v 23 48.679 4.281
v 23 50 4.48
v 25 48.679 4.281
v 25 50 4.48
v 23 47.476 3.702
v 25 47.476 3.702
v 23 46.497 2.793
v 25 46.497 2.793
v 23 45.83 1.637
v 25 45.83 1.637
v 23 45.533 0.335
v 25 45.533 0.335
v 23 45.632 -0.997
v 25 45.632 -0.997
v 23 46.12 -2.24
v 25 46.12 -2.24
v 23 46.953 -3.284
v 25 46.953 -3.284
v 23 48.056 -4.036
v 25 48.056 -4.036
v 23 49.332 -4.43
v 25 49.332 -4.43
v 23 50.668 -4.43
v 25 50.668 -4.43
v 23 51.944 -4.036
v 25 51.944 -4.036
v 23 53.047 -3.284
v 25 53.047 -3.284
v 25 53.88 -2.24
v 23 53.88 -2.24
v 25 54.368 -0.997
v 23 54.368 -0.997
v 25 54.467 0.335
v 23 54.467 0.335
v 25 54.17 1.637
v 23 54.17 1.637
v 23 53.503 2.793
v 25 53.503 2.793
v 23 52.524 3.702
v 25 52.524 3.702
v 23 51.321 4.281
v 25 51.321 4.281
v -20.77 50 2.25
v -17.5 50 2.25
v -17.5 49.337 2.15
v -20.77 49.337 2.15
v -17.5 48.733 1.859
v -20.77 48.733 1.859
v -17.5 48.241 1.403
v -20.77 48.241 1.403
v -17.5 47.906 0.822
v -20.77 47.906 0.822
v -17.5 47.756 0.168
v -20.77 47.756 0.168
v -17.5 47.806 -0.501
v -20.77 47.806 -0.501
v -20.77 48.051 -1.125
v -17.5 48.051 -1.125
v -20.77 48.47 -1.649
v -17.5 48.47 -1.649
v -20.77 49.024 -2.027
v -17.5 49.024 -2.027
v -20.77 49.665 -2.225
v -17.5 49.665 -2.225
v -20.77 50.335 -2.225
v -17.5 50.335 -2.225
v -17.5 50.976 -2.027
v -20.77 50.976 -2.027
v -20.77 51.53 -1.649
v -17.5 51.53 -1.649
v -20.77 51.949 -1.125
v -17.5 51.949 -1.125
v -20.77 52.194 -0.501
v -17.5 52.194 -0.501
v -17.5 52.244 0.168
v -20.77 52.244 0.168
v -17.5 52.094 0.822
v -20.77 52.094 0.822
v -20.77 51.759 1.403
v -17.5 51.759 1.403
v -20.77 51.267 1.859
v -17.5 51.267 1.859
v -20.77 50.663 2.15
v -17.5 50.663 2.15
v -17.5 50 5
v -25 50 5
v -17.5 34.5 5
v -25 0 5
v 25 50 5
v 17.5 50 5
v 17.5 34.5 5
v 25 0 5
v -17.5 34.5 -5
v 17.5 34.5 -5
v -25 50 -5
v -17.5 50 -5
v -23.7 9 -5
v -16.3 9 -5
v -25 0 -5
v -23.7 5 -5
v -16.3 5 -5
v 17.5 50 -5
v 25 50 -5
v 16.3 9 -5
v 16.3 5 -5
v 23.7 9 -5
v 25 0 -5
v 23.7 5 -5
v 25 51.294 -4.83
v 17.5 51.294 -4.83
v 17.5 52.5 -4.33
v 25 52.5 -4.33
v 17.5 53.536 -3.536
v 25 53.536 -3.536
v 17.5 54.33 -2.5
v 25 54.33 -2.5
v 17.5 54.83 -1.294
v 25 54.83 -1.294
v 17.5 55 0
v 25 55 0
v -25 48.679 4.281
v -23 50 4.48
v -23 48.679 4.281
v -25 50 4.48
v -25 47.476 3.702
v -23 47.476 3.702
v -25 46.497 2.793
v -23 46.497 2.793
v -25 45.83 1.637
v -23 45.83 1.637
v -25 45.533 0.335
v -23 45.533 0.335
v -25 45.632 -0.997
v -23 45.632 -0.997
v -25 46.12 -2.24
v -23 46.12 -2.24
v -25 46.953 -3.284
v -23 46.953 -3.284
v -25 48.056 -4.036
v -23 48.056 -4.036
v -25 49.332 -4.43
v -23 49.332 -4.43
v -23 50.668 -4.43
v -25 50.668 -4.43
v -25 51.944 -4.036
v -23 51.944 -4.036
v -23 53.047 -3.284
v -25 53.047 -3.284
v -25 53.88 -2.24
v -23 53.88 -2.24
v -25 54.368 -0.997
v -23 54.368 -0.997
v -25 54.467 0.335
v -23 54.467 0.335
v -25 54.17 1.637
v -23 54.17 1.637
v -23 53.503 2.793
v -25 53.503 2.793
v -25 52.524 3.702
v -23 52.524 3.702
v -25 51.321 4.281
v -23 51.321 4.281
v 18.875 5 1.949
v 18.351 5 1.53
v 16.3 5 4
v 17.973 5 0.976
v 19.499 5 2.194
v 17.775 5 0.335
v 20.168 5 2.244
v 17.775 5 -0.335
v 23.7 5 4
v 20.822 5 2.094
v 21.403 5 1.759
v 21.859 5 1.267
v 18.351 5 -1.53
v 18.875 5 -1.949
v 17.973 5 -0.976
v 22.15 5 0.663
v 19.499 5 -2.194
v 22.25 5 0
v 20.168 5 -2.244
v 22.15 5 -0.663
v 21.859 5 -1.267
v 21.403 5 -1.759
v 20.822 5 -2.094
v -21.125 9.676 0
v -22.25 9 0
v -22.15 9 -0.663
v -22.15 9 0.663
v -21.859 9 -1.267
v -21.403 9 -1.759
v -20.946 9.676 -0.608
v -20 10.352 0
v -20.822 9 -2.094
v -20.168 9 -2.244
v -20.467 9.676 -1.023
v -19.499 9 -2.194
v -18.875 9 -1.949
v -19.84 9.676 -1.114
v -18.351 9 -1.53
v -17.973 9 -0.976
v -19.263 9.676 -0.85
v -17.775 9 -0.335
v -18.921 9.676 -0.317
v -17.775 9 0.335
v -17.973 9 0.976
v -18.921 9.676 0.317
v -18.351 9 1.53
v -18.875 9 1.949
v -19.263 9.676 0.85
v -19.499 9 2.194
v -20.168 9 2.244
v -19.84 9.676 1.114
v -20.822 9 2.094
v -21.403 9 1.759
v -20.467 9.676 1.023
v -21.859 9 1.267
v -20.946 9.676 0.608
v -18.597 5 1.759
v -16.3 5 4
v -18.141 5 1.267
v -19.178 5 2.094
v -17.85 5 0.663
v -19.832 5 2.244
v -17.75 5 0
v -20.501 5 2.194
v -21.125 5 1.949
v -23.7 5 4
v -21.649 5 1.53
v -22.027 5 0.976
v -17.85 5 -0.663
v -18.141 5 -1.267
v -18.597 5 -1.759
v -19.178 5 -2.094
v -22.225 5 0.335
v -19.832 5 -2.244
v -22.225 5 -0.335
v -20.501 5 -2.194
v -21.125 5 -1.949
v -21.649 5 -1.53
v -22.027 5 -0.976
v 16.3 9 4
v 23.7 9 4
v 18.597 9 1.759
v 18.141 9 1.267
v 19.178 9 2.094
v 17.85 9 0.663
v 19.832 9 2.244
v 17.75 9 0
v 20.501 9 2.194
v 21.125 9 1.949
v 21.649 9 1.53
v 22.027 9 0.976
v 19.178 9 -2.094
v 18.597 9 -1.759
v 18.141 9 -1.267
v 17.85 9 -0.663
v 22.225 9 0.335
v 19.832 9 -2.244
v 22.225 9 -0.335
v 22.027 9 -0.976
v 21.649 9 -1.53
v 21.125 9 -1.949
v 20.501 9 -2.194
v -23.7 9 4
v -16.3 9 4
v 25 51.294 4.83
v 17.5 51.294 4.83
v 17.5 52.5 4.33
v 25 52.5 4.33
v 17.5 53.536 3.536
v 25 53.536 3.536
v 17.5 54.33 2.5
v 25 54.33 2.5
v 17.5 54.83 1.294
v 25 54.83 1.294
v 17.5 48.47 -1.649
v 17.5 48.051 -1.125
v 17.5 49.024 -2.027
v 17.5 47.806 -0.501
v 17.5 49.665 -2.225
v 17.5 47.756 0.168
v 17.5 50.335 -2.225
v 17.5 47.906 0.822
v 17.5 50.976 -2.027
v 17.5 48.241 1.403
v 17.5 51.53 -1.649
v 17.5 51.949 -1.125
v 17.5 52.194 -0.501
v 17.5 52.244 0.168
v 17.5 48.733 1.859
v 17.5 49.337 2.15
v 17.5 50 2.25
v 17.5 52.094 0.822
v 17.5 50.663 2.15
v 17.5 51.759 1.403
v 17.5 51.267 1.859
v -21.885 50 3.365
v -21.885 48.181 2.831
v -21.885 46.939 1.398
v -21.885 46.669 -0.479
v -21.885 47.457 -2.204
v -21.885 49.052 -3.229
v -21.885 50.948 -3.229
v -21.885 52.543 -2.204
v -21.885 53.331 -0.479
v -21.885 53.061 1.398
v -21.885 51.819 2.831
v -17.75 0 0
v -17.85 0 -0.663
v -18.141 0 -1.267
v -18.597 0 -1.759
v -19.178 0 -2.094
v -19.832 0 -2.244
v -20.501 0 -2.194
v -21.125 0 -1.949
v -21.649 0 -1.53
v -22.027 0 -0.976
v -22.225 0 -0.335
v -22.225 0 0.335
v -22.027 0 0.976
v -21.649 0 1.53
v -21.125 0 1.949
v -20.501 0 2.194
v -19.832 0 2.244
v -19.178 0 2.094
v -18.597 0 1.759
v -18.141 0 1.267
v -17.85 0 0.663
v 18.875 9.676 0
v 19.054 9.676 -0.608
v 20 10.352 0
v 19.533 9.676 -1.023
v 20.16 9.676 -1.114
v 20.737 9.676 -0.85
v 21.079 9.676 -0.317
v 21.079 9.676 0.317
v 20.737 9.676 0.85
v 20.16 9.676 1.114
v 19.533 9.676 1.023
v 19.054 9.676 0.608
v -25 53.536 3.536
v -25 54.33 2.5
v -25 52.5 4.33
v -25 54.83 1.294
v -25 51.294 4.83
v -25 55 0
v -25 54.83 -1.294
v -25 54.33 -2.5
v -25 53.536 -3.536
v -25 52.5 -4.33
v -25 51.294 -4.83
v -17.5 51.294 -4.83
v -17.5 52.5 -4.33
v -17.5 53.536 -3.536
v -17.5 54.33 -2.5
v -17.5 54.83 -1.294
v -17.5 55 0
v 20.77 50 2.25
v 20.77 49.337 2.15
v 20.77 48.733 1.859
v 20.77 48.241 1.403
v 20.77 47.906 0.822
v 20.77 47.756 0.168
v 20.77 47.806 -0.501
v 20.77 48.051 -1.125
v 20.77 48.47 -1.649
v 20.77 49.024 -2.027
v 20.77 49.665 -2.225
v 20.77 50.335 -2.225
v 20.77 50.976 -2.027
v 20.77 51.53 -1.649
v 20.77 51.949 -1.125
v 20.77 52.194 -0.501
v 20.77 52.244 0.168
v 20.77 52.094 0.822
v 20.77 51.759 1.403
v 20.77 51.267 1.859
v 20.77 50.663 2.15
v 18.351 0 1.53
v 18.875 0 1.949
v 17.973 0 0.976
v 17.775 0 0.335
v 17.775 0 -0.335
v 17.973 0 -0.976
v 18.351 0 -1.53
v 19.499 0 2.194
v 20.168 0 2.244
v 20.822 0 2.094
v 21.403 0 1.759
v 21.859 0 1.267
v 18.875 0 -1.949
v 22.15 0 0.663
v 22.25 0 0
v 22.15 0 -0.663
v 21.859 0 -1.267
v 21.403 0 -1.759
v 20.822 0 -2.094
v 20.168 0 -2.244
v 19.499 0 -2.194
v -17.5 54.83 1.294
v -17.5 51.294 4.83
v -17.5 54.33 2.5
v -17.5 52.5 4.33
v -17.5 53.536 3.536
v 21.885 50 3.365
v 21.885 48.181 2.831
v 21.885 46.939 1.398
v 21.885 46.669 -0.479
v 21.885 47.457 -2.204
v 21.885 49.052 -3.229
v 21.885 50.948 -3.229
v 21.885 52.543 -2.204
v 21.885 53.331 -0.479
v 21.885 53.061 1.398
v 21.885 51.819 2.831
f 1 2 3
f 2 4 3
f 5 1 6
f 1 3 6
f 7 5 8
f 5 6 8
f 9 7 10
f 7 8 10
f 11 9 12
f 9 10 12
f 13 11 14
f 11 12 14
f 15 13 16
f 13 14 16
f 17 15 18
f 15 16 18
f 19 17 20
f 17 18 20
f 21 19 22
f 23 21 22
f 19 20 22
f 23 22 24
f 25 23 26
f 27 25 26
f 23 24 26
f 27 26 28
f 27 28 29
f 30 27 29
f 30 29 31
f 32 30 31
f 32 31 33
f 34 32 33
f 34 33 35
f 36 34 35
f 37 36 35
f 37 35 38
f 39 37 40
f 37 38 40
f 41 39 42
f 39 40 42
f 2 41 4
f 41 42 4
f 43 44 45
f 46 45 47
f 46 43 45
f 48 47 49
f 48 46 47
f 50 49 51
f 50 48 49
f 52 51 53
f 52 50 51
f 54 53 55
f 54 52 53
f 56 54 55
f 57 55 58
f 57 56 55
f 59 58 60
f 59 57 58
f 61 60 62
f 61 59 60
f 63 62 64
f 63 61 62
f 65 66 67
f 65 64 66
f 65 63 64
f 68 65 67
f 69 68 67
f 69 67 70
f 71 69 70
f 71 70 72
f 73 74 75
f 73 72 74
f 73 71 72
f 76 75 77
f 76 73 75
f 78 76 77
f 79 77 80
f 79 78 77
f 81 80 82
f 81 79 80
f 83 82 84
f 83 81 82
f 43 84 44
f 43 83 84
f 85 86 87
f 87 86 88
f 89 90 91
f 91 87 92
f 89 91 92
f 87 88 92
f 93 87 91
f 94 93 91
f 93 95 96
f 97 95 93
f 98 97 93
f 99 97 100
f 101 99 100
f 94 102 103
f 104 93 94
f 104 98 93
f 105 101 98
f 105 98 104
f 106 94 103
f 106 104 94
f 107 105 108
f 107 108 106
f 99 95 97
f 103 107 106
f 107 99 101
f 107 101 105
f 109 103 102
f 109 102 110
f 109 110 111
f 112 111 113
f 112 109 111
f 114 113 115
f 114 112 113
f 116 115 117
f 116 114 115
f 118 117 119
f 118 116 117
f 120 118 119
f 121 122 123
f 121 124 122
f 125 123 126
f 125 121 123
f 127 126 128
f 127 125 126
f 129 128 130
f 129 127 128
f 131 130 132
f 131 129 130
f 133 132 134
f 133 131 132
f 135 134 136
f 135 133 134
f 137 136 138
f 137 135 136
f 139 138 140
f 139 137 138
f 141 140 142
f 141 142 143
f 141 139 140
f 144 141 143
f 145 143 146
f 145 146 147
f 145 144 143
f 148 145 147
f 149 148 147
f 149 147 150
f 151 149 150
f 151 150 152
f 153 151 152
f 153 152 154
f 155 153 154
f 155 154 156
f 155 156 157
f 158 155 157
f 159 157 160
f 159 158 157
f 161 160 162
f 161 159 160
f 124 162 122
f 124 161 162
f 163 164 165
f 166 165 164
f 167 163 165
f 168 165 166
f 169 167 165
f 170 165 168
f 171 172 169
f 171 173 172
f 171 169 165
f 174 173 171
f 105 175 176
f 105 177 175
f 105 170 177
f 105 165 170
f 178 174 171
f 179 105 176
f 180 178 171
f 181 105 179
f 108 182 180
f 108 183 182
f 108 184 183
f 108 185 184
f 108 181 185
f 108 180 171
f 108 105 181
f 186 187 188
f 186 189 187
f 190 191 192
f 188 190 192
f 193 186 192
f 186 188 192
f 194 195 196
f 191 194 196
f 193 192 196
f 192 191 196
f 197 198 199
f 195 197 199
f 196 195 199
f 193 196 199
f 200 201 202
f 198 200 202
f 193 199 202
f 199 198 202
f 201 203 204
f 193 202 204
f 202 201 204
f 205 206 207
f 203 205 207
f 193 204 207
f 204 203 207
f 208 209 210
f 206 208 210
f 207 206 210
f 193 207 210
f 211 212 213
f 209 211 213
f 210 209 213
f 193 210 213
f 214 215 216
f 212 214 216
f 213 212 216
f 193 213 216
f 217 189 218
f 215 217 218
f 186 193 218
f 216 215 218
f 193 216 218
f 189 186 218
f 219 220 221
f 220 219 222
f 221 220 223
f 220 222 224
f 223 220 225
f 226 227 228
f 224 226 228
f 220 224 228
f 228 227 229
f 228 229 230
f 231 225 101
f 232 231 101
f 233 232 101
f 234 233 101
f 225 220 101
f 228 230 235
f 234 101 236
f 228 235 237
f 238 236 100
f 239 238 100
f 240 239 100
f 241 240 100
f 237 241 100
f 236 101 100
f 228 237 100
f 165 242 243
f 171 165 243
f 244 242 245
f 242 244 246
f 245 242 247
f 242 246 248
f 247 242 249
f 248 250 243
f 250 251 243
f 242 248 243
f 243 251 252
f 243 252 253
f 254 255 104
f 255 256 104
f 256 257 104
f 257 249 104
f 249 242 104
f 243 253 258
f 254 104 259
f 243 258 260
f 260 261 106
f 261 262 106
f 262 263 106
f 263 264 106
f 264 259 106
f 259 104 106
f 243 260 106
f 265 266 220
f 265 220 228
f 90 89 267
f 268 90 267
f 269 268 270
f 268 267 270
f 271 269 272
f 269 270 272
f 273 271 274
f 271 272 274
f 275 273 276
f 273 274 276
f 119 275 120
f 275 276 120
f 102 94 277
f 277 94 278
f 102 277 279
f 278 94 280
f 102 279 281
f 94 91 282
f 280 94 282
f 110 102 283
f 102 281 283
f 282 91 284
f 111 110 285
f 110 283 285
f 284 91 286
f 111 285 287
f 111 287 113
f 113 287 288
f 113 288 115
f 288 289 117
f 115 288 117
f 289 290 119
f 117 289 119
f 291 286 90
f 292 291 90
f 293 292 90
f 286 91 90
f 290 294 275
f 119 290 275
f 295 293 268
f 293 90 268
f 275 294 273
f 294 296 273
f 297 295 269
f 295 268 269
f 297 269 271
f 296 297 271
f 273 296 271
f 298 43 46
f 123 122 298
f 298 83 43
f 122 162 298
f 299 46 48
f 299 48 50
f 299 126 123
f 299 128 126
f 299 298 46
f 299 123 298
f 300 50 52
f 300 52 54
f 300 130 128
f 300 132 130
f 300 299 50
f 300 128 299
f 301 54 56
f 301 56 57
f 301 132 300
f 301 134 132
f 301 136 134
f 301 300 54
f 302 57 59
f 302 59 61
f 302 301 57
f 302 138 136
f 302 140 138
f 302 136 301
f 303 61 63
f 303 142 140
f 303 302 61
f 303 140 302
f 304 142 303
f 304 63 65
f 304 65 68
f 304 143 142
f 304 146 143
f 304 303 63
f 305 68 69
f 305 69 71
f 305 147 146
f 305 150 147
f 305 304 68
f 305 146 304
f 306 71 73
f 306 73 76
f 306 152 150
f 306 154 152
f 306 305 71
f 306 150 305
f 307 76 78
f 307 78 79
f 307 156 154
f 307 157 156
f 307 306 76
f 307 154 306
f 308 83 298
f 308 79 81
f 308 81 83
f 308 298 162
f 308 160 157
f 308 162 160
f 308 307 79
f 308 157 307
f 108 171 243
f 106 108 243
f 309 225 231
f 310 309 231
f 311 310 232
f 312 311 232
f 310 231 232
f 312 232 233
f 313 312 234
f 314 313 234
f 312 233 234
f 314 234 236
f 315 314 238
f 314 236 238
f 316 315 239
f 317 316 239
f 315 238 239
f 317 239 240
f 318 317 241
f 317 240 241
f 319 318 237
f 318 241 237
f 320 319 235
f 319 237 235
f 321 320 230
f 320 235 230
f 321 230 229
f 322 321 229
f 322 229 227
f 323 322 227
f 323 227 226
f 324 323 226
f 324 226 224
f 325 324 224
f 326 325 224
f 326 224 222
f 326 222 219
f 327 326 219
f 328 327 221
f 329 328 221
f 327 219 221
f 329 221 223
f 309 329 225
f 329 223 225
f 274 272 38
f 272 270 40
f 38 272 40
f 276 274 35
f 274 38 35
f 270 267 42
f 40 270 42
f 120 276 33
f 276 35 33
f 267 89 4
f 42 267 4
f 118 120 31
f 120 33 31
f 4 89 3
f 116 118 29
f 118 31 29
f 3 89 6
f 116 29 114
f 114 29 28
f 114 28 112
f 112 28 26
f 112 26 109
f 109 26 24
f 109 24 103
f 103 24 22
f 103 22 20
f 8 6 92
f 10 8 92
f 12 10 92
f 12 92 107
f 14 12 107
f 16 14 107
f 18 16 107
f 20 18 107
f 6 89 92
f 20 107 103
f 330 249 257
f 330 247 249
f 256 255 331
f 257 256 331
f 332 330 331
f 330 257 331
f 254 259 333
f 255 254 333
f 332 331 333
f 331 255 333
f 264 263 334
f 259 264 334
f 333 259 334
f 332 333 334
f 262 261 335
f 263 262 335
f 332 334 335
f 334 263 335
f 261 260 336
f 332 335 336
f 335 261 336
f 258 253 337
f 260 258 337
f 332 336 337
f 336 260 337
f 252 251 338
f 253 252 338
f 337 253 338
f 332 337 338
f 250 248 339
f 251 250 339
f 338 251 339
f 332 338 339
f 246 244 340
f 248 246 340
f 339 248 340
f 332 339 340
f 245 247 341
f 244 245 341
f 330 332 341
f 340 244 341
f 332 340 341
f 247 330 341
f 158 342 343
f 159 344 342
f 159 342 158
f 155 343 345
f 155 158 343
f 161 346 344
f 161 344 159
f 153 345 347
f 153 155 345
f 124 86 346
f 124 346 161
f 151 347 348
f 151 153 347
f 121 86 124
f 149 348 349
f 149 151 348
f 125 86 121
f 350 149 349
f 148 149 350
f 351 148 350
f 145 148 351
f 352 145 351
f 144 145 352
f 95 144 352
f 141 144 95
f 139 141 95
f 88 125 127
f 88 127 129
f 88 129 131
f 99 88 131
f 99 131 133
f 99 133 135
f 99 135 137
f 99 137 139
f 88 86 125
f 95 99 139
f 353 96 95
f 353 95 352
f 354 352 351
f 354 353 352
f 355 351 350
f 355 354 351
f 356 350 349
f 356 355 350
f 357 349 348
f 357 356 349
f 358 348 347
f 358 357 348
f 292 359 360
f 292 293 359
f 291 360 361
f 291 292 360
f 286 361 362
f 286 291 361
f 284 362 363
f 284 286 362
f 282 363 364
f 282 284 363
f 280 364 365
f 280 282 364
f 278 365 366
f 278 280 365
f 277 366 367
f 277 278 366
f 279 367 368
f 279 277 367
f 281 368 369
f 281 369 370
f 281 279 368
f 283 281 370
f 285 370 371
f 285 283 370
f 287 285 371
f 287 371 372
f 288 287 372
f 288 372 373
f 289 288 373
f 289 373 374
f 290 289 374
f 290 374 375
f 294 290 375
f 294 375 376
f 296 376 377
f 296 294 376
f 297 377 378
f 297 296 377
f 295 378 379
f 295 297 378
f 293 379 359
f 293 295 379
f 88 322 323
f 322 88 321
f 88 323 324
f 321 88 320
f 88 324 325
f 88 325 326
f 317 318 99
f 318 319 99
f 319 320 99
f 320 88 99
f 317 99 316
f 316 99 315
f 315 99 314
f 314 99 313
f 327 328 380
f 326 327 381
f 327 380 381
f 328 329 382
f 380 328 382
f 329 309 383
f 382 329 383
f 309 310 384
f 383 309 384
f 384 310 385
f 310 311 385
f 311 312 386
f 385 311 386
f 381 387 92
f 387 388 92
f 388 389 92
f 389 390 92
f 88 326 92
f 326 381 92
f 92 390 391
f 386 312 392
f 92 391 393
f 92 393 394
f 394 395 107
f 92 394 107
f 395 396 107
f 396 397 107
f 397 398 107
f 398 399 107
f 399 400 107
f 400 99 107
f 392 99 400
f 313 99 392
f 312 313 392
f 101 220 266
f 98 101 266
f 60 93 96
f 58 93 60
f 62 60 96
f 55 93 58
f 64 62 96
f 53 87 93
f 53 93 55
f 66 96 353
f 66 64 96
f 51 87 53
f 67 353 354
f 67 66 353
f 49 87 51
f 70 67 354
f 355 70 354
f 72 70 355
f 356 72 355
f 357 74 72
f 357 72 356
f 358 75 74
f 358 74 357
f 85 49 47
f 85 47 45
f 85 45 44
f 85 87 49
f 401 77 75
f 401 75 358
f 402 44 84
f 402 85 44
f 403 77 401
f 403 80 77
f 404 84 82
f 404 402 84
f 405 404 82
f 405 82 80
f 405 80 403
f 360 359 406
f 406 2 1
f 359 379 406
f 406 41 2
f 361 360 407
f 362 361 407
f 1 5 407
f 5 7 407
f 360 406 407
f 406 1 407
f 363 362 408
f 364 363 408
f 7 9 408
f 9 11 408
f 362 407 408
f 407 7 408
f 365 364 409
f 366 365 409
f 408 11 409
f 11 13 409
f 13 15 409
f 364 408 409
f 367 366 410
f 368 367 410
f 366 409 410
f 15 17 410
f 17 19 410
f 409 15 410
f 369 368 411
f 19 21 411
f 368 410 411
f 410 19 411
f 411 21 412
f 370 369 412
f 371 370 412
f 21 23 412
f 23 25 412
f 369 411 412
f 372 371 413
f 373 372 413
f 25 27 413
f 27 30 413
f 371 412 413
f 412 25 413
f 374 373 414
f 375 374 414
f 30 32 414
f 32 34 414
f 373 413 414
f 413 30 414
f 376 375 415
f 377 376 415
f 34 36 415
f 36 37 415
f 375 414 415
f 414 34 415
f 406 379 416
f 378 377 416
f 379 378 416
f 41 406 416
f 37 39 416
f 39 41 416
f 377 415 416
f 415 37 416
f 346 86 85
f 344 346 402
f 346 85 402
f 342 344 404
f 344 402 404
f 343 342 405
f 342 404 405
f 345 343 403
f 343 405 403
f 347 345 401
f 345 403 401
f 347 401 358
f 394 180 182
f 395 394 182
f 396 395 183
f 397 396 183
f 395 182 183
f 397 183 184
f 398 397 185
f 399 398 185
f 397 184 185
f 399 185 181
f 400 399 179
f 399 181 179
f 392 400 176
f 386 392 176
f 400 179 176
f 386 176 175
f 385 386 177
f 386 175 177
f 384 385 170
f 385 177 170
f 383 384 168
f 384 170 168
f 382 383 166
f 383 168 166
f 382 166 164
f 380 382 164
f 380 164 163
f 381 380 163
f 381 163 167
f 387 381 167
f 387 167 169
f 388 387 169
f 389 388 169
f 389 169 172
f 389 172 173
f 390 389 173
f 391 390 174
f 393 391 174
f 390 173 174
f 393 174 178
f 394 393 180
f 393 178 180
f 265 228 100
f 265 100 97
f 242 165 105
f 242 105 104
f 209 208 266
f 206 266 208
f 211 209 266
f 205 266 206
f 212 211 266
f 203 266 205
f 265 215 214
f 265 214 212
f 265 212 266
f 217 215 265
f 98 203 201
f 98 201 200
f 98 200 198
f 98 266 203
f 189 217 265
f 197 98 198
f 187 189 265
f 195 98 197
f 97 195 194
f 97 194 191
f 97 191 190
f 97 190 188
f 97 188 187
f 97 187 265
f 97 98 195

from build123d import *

# Parameters (mm, degrees)
SKETCH1_W                = 50
SKETCH1_H                = 10
BOSS_EXTRUDE1_DEPTH      = 55
FILLET1_R                = 5
SKETCH2_W                = 35
SKETCH2_H                = 20.5
CUT_EXTRUDE1_DEPTH       = 62.23724357
M4_CLEARANCE_HOLE1_D     = 4.5
M4_CLEARANCE_HOLE1_DEPTH = 9
M4_CLEARANCE_HOLE1_TIP   = 1.351936393
SKETCH9_W                = 7.4
SKETCH9_H                = 4
CUT_EXTRUDE2_DEPTH       = 9


with BuildPart() as part:
    # Sketch1 → Boss-Extrude1 (new body)
    with BuildSketch(Plane(origin=(0, 0, 0), x_dir=(1, 0, 0), z_dir=(0, 1, 0))):
        Rectangle(SKETCH1_W, SKETCH1_H)
    extrude(amount=BOSS_EXTRUDE1_DEPTH)

    # Fillet1
    fillet1_edges = [part.edges().sort_by_distance(p)[0] for p in [
        (0, 55, -5),
        (0, 55, 5),
    ]]
    fillet(fillet1_edges, radius=FILLET1_R - 0.0001)  # a hair under: the kernel refuses the full size

    # Sketch2 → Cut-Extrude1 (cut, through all)
    with BuildSketch(Plane.XY.offset(5)):
        with Locations((0, 44.75)):
            Rectangle(SKETCH2_W, SKETCH2_H)
    extrude(amount=-CUT_EXTRUDE1_DEPTH, mode=Mode.SUBTRACT)

    # Sketch5 → CSK for M4 SFHCS1 (revolve, cut)
    with BuildSketch(Plane(origin=(-25, 50, 0), x_dir=(0, 0, 1), z_dir=(0, 1, 0))):
        Polygon((0, 0), (0, 50), (2.25, 50), (2.25, 4.23), (4.48, 2), (4.48, 0), align=None)
    csk_for_m4_sfhcs1 = revolve(axis=Axis((-31.35, 50, 0), (1, 0, 0)), mode=Mode.SUBTRACT)

    # Mirror1: CSK for M4 SFHCS1 across plane
    add(csk_for_m4_sfhcs1.mirror(Plane(origin=(0, 0, 0), x_dir=(0, 0, 1), z_dir=(1, 0, 0))), mode=Mode.SUBTRACT)

    # M4 Clearance Hole1
    with Locations(Plane(origin=(0, 0, 0), x_dir=(-1, 0, 0), z_dir=(0, -1, 0))):
        with Locations((-20, 0), (20, 0)):
            Hole(M4_CLEARANCE_HOLE1_D / 2, depth=M4_CLEARANCE_HOLE1_DEPTH)
            with Locations((0, 0, -(M4_CLEARANCE_HOLE1_DEPTH + M4_CLEARANCE_HOLE1_TIP / 2))):  # 118° drill point
                Cone(0, M4_CLEARANCE_HOLE1_D / 2, M4_CLEARANCE_HOLE1_TIP, mode=Mode.SUBTRACT)

    # Sketch9 → Cut-Extrude2 (cut)
    with BuildSketch(Plane(origin=(0, 0, -5), x_dir=(-1, 0, 0), z_dir=(0, 0, -1))):
        with Locations((20, 7)):
            Rectangle(SKETCH9_W, SKETCH9_H)
    cut_extrude2 = extrude(amount=-CUT_EXTRUDE2_DEPTH, mode=Mode.SUBTRACT)

    # Mirror2: Cut-Extrude2 across plane
    add(cut_extrude2.mirror(Plane(origin=(0, 0, 0), x_dir=(0, 0, 1), z_dir=(1, 0, 0))), mode=Mode.SUBTRACT)


solid = part.part
